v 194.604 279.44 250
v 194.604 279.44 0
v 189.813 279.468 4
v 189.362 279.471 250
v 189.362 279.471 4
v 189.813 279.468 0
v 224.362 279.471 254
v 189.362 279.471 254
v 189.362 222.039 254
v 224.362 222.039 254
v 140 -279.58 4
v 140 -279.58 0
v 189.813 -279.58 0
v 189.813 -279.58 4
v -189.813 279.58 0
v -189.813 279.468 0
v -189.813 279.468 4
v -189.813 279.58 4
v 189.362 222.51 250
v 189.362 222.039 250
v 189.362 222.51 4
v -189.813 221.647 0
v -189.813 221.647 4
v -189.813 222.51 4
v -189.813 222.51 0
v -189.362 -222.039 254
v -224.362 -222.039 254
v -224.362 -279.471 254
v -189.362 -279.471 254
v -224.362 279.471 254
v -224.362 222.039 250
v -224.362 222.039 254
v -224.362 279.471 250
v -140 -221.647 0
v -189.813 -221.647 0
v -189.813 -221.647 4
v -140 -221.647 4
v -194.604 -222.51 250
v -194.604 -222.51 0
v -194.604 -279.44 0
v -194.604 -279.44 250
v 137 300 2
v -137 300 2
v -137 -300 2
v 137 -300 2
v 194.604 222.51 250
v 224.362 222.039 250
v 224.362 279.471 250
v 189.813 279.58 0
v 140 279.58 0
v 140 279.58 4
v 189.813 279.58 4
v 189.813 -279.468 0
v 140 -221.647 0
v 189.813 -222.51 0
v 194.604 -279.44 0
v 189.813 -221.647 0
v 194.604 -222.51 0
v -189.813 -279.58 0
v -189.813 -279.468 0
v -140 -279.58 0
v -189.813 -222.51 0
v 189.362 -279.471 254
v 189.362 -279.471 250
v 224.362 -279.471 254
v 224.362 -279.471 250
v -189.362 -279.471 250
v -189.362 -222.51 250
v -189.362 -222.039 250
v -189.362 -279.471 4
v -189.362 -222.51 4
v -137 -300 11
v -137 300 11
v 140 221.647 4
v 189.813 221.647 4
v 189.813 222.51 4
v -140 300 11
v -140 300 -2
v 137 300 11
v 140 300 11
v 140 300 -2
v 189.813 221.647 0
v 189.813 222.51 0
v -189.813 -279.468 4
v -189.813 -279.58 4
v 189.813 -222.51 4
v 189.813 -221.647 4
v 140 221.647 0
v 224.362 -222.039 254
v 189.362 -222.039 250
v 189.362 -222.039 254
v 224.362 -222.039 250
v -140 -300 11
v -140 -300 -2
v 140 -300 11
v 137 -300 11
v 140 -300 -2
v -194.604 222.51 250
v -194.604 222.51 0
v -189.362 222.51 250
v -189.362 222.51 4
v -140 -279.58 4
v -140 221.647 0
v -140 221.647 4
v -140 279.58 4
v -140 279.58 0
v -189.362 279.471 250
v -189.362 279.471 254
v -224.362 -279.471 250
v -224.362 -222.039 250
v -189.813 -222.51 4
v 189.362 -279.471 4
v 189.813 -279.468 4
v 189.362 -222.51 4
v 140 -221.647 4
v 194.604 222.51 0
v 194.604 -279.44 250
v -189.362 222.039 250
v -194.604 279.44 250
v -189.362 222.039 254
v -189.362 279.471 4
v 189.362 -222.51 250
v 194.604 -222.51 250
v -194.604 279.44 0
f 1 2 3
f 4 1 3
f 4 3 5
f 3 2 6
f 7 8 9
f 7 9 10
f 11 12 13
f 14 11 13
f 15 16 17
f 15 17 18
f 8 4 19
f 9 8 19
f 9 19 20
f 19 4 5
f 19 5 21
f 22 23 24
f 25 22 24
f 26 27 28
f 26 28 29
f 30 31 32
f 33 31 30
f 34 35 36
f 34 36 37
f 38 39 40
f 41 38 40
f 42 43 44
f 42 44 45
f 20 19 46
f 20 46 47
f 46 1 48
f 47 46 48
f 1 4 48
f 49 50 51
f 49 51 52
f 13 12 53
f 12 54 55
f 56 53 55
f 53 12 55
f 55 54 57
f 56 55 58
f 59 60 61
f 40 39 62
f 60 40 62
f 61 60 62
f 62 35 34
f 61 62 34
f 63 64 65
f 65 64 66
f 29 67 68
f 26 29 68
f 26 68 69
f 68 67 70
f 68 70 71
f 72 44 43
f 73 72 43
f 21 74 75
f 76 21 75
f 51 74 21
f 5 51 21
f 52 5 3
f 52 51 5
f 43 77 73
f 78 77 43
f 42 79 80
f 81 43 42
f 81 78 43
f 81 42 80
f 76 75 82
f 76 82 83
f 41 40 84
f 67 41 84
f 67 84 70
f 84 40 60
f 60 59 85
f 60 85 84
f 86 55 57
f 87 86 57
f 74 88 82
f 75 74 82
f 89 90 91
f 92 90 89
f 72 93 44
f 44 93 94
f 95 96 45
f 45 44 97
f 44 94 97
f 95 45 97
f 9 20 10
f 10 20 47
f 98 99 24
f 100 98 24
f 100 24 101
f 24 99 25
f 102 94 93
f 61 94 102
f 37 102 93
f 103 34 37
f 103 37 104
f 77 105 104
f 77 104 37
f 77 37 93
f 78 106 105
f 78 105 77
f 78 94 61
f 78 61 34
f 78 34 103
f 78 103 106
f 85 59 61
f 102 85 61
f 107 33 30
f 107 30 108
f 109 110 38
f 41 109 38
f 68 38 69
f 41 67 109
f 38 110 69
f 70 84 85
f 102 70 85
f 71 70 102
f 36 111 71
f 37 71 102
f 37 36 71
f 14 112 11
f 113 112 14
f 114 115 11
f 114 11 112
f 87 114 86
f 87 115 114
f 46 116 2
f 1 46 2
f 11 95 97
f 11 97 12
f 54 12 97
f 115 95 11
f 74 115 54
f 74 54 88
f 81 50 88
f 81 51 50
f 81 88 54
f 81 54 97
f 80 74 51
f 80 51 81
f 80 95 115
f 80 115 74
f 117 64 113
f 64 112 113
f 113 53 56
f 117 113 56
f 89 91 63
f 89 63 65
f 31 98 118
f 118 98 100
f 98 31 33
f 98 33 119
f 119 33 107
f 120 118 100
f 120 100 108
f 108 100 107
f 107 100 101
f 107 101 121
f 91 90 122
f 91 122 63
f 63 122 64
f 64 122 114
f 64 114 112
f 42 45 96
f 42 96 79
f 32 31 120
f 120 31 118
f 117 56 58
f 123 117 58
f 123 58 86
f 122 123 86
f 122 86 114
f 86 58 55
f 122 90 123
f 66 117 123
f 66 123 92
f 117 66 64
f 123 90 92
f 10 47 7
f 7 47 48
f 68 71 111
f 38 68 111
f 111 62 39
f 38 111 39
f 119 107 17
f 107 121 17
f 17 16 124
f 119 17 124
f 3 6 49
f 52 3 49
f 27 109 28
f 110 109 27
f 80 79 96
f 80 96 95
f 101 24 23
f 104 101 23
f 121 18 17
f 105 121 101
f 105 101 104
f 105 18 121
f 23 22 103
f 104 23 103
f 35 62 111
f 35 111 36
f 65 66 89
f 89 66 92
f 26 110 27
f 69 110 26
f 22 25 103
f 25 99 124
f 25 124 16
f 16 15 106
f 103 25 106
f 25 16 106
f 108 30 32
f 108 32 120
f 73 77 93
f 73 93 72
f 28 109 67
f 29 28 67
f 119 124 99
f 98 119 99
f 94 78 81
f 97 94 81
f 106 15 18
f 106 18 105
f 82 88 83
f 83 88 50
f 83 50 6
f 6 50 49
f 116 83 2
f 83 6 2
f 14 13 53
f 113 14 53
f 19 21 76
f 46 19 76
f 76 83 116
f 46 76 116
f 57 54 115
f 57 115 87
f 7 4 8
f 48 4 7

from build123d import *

# Parameters (mm, degrees)
F0_W     = 280
F0_H     = 600
F1_DEPTH = 2
F2_W     = 3
F2_H     = 600
F3_DEPTH = 9
F4_W     = 50
F4_H     = 57.932376
F5_DEPTH = 4
F7_DEPTH = 250
F8_W     = 35
F8_H     = 57.431721
F9_DEPTH = 4


with BuildPart() as f1:
    # F0 (on Top) → F1 (new body, symmetric)
    with BuildSketch(Plane.XY):
        Rectangle(F0_W, F0_H)
    extrude(amount=F1_DEPTH, both=True)

    # F2 (on face) → F3 (join)
    with BuildSketch(Plane.XY.offset(2)):
        with Locations((-138.5, 0)):
            Rectangle(F2_W, F2_H)
        with Locations((138.5, 0)):
            Rectangle(F2_W, F2_H)
    extrude(amount=F3_DEPTH)

    # F4 (on Top) → F5 (join)
    with BuildSketch(Plane.XY):
        with Locations((-164.812601, 250.6136)):
            Rectangle(F4_W, F4_H)
        with Locations((164.812601, 250.6136)):
            Rectangle(F4_W, F4_H)
        with Locations((-164.812601, -250.6136)):
            Rectangle(F4_W, F4_H)
        with Locations((164.812601, -250.6136)):
            Rectangle(F4_W, F4_H)
    extrude(amount=F5_DEPTH)

    # F6 (on Top) → F7 (join)
    with BuildSketch(Plane.XY):
        Polygon((-189.361796, 222.509515), (-189.361796, 279.471008), (-194.60392, 279.439882), (-194.60392, 222.509515), align=None)
        Polygon((194.60392, 222.509515), (194.60392, 279.439882), (189.361796, 279.471008), (189.361796, 222.509515), align=None)
        Polygon((194.60392, -222.509515), (189.361796, -222.509515), (189.361796, -279.471008), (194.60392, -279.439882), align=None)
        Polygon((-194.60392, -222.509515), (-194.60392, -279.439882), (-189.361796, -279.471008), (-189.361796, -222.509515), align=None)
    extrude(amount=F7_DEPTH)

    # F8 (on face) → F9 (join)
    with BuildSketch(Plane.XY.offset(250)):
        with Locations((-206.861796, 250.755147)):
            Rectangle(F8_W, F8_H)
        with Locations((206.861796, 250.755147)):
            Rectangle(F8_W, F8_H)
        with Locations((206.861796, -250.755147)):
            Rectangle(F8_W, F8_H)
        with Locations((-206.861796, -250.755147)):
            Rectangle(F8_W, F8_H)
    extrude(amount=F9_DEPTH)


solid = f1.part
